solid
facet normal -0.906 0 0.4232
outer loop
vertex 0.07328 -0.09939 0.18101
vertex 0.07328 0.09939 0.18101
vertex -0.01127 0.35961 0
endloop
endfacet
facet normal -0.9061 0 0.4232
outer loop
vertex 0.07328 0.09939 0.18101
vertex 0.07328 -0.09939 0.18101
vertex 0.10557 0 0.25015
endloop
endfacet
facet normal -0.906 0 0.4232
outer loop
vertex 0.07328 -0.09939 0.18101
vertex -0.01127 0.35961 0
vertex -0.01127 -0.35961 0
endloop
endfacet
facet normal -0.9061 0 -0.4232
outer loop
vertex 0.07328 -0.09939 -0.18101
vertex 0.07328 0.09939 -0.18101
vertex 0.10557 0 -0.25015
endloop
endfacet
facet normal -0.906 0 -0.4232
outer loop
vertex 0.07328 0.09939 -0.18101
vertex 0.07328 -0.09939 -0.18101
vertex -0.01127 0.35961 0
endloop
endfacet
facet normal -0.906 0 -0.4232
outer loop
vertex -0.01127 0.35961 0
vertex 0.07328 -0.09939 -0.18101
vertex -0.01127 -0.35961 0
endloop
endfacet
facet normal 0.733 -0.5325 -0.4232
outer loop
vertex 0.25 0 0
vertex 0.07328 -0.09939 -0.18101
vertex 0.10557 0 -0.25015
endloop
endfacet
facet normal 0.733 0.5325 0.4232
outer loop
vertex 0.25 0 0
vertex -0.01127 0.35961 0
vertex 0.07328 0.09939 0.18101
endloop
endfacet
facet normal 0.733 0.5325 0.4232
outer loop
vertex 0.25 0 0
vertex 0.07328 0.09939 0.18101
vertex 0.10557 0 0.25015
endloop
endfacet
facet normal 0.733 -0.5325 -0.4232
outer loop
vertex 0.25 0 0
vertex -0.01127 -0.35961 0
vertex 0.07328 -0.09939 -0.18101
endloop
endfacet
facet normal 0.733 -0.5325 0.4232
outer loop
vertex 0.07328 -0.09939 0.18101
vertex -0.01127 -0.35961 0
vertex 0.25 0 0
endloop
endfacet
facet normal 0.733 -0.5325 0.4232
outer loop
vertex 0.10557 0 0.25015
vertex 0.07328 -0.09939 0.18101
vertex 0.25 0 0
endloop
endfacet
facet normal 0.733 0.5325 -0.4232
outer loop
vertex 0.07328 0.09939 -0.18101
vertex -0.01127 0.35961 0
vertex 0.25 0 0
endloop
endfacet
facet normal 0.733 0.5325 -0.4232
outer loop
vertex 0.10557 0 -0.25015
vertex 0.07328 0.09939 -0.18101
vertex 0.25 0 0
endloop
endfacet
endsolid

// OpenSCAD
intersection()
	{
		translate([1,0,0]){sphere(1.25);}
		translate([-1,0,0]){sphere(1.25);}
    }
	
